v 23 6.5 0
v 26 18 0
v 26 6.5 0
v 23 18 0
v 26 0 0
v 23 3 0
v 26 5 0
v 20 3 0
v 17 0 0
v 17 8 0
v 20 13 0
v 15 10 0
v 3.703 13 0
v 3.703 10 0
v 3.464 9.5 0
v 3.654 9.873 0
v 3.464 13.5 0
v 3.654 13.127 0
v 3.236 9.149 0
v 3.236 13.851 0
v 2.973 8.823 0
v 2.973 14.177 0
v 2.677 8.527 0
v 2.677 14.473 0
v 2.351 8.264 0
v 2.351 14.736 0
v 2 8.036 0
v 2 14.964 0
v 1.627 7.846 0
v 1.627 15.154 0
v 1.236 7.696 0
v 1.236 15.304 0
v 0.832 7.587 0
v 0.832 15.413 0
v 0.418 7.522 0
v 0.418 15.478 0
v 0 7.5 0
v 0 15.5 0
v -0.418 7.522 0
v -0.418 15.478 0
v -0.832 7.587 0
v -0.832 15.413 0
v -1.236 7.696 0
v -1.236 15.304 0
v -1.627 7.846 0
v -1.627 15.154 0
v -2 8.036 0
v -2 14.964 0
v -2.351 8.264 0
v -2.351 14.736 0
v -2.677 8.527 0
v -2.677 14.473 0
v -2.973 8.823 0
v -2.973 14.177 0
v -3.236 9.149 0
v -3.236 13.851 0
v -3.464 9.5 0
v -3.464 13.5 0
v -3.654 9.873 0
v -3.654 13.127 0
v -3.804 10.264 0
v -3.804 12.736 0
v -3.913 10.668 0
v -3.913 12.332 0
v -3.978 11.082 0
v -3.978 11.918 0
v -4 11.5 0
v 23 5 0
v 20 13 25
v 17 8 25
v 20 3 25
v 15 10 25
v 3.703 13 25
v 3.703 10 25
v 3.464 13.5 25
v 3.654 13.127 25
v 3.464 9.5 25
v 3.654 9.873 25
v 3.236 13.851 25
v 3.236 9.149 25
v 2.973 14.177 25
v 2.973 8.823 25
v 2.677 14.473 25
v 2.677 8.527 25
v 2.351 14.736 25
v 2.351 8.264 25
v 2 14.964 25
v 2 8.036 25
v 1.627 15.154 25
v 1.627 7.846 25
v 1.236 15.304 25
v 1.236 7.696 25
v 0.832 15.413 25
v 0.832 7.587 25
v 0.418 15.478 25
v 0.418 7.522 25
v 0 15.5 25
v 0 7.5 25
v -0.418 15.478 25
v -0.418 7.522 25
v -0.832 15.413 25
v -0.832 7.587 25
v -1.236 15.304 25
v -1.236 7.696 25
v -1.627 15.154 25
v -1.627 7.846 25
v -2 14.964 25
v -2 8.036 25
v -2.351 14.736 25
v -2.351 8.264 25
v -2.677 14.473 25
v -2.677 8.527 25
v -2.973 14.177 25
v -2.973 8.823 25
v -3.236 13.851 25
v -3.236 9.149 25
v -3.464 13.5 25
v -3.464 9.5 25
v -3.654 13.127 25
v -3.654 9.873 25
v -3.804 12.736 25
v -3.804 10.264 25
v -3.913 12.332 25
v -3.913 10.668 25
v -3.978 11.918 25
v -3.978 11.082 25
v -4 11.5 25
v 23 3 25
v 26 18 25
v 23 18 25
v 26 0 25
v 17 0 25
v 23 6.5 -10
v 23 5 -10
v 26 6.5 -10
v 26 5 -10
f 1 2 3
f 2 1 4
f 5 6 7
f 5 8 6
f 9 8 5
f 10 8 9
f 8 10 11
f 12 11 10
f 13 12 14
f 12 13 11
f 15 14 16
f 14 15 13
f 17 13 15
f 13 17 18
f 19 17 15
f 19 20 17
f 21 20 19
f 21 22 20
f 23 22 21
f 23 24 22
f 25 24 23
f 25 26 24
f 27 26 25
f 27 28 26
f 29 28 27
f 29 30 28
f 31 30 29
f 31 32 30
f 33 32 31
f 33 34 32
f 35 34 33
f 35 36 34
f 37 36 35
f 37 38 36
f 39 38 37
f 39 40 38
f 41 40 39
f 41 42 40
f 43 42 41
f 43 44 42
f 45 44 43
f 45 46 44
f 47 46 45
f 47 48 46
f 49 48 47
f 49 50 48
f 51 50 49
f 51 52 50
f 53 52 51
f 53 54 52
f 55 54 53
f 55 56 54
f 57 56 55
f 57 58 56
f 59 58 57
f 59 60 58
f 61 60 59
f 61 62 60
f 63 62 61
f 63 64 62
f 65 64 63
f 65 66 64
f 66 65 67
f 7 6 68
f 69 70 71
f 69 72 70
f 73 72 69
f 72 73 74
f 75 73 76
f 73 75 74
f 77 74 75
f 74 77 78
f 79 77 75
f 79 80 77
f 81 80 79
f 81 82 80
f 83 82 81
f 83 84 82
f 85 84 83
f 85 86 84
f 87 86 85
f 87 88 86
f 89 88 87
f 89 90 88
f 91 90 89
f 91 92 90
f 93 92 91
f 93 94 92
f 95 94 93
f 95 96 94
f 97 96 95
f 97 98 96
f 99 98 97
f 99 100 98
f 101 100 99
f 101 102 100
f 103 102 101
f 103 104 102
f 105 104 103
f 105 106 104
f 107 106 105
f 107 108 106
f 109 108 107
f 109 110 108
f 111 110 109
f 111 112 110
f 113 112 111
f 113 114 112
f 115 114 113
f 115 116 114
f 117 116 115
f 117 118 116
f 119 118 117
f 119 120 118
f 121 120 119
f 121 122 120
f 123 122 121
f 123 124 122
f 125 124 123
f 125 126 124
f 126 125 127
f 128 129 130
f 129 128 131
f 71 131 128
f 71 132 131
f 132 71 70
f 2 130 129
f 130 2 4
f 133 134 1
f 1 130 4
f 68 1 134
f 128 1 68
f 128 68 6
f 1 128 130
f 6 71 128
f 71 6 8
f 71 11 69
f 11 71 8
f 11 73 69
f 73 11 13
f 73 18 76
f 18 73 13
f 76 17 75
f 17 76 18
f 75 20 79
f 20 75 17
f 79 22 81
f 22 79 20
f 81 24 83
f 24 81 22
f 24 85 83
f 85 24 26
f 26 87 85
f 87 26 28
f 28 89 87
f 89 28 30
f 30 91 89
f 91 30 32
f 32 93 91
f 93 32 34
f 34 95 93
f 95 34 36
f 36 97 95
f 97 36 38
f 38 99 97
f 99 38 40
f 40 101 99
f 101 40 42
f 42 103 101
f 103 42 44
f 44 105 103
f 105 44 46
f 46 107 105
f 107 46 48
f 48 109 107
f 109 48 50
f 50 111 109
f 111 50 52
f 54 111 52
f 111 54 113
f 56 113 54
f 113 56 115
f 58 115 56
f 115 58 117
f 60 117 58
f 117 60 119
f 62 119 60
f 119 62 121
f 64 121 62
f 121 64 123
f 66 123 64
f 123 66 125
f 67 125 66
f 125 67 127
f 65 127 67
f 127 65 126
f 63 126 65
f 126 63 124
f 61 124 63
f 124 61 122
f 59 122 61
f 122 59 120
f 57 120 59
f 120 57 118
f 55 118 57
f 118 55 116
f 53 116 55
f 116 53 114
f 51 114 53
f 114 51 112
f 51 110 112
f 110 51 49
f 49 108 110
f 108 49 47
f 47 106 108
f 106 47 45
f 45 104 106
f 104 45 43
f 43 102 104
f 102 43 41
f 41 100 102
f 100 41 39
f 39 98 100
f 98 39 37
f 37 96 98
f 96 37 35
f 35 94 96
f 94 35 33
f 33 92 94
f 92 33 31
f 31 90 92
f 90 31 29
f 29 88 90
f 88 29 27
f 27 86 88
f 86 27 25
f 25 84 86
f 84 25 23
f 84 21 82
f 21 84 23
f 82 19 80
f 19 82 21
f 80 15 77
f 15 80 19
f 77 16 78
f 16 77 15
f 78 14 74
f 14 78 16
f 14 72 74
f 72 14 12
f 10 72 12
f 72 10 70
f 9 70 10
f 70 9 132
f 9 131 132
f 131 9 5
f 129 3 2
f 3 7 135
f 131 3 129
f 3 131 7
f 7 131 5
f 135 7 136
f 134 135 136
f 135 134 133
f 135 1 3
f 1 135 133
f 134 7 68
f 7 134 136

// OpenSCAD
handleLength = 25;
catchLength = 10;
acrylicWidth = 3;

module handle(h) {
    linear_extrude(height = h) {         
        // 20 -> 25 gives 5mm acrylic.
        polygon(points=[[0,13],[20,13],[20,3],[20 + acrylicWidth,3],[20+acrylicWidth,18], [23+acrylicWidth,18],[23+acrylicWidth,0],[17,0],[17,8], [15,10], [0,10],[0,13]]);
        
        translate([0,11.5,0]) {
            circle(d=8, $fn=60);
        }
    }
    
    
}

module leftCatch() {
    translate([20+acrylicWidth,5,-catchLength]) {
        cube([3,1.5,catchLength]);   
    }
}

module rightCatch() {
    translate([20+acrylicWidth,5,handleLength]) {
        cube([3,1.5,catchLength]);   
    }
}

handle(handleLength);

leftCatch();
//rightCatch();
